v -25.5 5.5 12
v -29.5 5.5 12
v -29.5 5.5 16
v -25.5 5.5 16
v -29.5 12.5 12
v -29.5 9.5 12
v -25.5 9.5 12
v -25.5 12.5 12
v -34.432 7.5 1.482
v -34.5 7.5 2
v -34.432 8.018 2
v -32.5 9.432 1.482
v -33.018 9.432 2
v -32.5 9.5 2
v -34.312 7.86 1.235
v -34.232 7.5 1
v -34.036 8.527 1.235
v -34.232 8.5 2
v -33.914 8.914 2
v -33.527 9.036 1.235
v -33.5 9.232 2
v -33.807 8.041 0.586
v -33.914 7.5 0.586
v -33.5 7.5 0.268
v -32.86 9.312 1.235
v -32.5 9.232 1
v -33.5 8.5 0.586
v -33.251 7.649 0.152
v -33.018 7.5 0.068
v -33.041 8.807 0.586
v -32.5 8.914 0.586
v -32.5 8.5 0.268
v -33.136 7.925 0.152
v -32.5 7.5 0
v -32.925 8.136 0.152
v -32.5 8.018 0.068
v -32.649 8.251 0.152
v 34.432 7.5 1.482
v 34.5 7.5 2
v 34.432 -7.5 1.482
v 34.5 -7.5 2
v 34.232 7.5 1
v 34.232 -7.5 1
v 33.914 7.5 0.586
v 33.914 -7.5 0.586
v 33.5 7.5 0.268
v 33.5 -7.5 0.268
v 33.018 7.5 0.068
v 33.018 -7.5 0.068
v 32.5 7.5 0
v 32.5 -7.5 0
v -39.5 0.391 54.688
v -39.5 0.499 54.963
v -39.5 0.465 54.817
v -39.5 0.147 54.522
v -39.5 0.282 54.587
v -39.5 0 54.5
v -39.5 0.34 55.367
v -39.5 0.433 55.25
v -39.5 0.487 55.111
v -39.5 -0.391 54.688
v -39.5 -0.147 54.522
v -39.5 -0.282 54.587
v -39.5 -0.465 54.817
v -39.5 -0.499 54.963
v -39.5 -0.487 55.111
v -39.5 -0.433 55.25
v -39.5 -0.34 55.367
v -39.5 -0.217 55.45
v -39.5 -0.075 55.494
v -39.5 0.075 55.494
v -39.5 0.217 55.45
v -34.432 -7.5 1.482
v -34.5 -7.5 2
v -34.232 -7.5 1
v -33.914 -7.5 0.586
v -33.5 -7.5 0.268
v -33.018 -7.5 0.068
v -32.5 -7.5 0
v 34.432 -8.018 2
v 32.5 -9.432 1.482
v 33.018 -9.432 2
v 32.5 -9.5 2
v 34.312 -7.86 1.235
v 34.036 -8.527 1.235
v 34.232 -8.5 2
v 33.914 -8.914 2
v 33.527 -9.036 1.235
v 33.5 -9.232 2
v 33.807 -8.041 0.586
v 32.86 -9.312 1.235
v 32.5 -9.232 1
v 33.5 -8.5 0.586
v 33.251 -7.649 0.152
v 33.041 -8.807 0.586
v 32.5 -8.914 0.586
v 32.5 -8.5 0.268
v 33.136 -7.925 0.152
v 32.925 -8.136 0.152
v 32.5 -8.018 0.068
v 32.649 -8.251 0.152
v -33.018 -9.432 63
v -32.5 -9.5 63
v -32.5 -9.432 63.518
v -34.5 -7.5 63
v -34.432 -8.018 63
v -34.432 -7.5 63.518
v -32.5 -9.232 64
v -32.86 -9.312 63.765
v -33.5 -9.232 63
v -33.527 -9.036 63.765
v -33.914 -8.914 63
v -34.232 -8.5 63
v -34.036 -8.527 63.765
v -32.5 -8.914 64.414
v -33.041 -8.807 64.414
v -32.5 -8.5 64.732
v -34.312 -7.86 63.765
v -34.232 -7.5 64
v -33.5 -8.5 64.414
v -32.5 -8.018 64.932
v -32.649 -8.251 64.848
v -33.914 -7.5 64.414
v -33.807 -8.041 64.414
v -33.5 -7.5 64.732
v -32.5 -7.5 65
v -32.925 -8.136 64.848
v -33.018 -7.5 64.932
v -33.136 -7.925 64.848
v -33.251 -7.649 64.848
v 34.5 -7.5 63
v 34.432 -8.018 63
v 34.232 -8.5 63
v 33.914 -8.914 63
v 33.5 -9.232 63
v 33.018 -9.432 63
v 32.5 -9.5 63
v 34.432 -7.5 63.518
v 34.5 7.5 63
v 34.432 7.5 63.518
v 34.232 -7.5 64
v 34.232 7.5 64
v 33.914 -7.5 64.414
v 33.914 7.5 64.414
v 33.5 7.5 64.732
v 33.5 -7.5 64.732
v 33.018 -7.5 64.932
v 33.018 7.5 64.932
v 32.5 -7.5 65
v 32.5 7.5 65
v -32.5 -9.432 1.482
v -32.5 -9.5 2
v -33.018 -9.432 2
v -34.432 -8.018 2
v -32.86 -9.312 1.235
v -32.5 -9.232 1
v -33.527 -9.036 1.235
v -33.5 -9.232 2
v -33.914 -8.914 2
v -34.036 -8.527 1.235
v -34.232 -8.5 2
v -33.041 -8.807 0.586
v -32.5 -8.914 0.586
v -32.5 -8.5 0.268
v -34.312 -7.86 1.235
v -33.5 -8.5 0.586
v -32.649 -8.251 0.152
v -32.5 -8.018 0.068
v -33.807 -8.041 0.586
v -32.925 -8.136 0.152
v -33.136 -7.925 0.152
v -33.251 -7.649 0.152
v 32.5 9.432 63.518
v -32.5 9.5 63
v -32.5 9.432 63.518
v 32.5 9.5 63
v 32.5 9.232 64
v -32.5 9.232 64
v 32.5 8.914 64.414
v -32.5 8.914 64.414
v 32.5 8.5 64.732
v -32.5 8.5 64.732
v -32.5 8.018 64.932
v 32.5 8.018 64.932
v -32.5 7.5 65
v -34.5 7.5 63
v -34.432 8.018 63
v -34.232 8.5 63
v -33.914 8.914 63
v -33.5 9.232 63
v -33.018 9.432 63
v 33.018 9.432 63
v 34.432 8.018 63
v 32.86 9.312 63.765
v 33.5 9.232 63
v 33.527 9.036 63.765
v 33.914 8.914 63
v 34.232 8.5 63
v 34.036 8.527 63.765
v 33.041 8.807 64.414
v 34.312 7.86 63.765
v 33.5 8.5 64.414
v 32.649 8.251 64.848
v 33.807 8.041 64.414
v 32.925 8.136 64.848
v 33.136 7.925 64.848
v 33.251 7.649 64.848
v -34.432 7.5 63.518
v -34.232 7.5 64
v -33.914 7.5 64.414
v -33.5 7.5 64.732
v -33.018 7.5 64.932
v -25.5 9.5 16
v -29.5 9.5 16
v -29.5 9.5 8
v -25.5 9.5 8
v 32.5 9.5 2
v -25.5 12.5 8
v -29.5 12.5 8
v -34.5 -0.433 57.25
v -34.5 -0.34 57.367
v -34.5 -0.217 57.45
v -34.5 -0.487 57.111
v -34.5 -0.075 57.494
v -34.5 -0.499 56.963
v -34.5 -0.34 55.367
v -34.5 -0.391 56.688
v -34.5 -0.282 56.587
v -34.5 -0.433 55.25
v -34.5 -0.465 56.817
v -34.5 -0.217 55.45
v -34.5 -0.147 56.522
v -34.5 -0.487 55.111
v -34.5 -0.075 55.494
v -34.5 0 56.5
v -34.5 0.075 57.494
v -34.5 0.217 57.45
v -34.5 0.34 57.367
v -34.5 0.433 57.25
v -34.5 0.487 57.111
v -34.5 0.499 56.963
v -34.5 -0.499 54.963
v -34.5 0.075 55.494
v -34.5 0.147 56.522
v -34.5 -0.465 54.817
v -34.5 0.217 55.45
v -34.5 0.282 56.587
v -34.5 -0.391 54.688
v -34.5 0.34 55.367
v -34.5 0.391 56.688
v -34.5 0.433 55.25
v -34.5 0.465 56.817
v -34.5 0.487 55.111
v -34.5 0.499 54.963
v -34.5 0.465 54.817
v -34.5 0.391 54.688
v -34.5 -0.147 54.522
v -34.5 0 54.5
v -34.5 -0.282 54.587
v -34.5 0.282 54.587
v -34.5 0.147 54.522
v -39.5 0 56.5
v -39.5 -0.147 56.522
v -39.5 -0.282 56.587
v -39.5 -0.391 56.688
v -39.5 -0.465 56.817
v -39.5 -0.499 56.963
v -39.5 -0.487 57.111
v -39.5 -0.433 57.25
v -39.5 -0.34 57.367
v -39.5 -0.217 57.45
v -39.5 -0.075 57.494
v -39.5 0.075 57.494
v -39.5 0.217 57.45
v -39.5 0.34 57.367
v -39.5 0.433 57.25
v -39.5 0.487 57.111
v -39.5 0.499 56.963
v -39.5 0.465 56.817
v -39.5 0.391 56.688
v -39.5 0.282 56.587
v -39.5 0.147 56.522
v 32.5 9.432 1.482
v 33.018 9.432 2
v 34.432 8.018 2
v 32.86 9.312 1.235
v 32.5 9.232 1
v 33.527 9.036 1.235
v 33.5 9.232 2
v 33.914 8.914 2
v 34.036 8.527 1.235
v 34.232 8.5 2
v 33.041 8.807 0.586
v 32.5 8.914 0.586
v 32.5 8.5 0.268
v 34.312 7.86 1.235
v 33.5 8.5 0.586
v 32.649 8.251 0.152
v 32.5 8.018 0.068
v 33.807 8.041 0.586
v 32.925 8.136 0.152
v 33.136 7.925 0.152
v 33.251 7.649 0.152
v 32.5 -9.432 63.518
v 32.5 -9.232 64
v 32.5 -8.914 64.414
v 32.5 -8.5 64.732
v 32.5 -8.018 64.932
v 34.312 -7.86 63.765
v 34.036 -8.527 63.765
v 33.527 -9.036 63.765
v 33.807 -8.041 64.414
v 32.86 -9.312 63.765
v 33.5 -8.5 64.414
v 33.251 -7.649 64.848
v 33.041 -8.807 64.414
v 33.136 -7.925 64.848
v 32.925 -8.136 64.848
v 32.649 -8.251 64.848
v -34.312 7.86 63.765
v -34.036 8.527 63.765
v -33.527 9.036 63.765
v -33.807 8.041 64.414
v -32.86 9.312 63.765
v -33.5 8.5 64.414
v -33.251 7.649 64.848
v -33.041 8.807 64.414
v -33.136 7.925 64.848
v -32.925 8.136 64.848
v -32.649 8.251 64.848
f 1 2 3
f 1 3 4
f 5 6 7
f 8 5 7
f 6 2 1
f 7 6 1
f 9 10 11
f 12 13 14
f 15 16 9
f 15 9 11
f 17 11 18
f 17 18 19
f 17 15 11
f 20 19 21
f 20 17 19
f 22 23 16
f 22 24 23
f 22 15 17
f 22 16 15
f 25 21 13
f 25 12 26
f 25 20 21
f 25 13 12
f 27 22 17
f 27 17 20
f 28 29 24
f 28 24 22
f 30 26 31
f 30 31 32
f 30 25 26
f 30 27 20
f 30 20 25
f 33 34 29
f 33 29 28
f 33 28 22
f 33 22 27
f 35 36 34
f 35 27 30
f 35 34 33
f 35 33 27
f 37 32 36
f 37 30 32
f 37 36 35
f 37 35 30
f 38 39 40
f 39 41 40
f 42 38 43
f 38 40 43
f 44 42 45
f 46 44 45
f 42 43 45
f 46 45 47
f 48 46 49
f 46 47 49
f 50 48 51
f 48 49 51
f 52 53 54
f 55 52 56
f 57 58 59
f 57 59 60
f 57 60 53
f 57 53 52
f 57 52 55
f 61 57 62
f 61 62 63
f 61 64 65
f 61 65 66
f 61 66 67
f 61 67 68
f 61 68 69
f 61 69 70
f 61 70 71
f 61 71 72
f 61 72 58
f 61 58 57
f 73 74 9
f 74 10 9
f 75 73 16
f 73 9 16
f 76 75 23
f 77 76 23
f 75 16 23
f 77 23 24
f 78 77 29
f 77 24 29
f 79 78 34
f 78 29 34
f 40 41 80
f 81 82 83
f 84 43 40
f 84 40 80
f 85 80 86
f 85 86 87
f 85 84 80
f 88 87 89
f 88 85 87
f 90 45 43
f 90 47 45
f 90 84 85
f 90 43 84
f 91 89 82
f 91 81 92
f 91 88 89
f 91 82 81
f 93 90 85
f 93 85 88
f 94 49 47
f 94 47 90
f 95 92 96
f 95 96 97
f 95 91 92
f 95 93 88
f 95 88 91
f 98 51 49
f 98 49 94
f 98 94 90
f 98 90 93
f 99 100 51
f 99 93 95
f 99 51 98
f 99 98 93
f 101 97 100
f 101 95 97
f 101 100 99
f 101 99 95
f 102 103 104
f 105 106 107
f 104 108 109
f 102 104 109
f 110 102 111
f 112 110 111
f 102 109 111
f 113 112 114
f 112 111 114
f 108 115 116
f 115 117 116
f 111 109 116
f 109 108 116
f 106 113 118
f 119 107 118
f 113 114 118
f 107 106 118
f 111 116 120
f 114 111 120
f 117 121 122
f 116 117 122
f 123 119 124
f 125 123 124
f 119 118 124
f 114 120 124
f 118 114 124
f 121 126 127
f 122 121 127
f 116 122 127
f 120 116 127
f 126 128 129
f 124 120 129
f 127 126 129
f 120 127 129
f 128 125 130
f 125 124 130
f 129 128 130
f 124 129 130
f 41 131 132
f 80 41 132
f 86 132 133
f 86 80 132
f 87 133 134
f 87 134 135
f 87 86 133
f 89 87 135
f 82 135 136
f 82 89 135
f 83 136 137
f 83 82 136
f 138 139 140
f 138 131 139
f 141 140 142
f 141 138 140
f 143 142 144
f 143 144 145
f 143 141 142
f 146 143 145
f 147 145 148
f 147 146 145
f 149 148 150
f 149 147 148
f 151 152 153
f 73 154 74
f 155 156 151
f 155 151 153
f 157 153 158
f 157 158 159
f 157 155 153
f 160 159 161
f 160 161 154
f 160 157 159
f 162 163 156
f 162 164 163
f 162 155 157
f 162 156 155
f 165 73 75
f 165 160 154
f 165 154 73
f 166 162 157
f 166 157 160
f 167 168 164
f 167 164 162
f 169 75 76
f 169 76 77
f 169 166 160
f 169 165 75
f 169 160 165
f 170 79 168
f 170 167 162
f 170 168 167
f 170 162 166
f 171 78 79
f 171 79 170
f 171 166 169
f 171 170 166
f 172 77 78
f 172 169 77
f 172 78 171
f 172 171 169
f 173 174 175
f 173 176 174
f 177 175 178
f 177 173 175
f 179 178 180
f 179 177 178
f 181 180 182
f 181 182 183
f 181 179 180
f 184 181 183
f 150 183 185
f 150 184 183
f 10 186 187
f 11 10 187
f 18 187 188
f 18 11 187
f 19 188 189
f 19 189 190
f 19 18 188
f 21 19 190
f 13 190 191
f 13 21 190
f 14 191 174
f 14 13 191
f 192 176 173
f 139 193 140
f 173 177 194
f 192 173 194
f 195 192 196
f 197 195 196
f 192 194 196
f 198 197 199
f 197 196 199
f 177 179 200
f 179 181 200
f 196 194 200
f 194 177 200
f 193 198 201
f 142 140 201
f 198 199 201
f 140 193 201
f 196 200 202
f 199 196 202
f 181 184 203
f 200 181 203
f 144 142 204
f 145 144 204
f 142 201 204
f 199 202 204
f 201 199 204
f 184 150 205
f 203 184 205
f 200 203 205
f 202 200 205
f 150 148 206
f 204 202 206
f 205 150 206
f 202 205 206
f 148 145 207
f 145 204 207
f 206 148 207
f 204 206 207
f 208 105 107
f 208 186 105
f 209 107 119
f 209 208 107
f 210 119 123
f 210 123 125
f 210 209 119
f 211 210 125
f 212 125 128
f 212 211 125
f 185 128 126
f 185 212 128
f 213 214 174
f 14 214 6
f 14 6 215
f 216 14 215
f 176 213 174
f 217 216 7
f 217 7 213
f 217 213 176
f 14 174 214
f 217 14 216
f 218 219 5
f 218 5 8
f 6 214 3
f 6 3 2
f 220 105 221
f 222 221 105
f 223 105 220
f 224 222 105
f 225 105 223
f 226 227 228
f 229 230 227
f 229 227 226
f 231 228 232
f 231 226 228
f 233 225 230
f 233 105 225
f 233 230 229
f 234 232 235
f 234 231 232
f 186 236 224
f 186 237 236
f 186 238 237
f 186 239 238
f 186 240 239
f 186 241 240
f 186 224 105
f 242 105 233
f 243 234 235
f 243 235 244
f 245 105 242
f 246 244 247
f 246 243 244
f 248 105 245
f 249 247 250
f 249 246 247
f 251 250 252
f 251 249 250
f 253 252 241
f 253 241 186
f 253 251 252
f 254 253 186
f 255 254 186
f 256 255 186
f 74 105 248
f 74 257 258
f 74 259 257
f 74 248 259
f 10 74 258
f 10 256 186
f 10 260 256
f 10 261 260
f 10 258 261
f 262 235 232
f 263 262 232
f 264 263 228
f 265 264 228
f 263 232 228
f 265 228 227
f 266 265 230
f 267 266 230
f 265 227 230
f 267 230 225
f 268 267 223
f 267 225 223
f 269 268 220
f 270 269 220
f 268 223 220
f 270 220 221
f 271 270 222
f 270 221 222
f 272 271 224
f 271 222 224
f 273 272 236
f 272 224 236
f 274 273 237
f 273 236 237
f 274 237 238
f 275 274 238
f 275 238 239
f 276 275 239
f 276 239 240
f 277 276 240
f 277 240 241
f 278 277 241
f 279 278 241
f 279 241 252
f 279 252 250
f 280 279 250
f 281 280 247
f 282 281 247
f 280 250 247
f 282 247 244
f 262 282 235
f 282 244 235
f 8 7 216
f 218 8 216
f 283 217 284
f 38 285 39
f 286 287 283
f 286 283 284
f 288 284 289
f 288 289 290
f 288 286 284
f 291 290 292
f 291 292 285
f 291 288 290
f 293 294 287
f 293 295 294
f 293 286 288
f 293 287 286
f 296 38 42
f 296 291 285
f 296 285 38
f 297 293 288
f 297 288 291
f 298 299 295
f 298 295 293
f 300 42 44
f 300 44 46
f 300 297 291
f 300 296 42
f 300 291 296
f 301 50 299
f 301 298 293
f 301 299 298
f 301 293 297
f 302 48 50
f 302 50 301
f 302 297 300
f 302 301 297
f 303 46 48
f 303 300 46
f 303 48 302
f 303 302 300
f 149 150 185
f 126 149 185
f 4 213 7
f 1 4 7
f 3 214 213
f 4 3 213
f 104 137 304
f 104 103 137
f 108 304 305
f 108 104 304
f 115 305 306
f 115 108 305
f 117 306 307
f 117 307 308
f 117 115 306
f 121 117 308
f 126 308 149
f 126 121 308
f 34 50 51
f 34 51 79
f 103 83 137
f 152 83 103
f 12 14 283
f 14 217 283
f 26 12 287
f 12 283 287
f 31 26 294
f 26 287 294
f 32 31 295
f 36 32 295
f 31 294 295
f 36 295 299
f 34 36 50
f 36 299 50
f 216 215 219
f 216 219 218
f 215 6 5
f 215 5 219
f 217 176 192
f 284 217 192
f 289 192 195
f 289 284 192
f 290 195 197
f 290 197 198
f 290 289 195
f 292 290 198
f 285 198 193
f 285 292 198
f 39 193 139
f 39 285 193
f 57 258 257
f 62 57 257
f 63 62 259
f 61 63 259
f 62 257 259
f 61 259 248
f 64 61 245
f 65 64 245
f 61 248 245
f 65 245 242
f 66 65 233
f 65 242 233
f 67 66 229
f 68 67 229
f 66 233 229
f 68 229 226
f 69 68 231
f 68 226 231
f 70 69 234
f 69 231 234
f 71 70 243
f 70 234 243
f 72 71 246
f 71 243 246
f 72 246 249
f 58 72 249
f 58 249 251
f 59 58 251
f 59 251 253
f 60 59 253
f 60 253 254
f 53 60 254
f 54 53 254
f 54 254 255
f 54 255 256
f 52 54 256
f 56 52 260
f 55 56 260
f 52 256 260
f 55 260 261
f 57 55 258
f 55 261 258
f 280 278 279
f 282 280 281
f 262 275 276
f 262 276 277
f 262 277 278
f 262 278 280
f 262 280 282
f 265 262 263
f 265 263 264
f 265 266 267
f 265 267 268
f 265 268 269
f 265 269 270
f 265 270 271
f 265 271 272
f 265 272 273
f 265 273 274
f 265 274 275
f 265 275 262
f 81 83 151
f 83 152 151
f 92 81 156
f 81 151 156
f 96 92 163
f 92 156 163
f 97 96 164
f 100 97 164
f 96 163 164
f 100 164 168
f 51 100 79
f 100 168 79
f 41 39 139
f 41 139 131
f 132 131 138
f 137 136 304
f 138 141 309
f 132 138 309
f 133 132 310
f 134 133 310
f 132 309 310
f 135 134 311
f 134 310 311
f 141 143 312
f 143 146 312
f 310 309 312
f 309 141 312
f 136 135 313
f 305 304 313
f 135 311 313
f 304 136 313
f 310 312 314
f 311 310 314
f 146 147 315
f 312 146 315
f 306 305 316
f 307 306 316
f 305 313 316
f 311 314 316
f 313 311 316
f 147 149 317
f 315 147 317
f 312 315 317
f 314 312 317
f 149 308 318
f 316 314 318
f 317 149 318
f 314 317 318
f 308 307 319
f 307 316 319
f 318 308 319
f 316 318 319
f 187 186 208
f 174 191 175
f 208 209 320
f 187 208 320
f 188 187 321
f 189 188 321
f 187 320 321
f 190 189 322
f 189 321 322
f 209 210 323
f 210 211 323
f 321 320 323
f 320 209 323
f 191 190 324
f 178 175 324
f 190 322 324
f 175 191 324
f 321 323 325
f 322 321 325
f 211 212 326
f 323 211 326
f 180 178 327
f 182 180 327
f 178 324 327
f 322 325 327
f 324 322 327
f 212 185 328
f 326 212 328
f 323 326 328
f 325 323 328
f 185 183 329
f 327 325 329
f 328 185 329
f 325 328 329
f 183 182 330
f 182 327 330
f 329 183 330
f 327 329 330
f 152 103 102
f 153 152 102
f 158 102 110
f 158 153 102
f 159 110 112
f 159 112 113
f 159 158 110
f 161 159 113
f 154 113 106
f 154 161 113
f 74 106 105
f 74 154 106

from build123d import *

# Parameters (mm, degrees)
EXTRUDE_1_DEPTH     = 65
FILLET_1_R          = 2
SKETCH_2_W          = 4
SKETCH_2_H          = 8
CUT_EXTRUDE_1_DEPTH = 4
SKETCH_4_W          = 4
SKETCH_4_H          = 4
EXTRUDE_2_DEPTH     = 7
SKETCH_5_R          = 0.5
EXTRUDE_3_DEPTH     = 5


with BuildPart() as part:
    # Эскиз1 → Бобышка-Вытянуть1 (new body)
    with BuildSketch(Plane.XY):
        with BuildLine():
            Line((32.5, -9.5), (-32.5, -9.5))
            ThreePointArc((-32.5, -9.5), (-33.914213562, -8.914213562), (-34.5, -7.5))
            Line((-34.5, -7.5), (-34.5, 7.5))
            ThreePointArc((-34.5, 7.5), (-33.914213562, 8.914213562), (-32.5, 9.5))
            Line((-32.5, 9.5), (32.5, 9.5))
            ThreePointArc((32.5, 9.5), (33.914213562, 8.914213562), (34.5, 7.5))
            Line((34.5, 7.5), (34.5, -7.5))
            ThreePointArc((34.5, -7.5), (33.914213562, -8.914213562), (32.5, -9.5))
        make_face()
    extrude(amount=EXTRUDE_1_DEPTH)

    # Скругление1
    fillet_1_edges = [part.edges().sort_by_distance(p)[0] for p in [
        (-33.914213562, -8.914213562, 65),
        (-34.5, 0, 0),
        (-33.914213562, 8.914213562, 0),
        (0, -9.5, 65),
        (33.914213562, -8.914213562, 65),
        (34.5, 0, 65),
        (33.914213562, 8.914213562, 65),
        (0, 9.5, 65),
        (-33.914213562, 8.914213562, 65),
        (-34.5, 0, 65),
        (0, 9.5, 0),
        (33.914213562, 8.914213562, 0),
        (34.5, 0, 0),
        (33.914213562, -8.914213562, 0),
        (0, -9.5, 0),
        (-33.914213562, -8.914213562, 0),
    ]]
    fillet(fillet_1_edges, radius=FILLET_1_R)

    # Эскиз2 → Вырез-Вытянуть1 (cut)
    with BuildSketch(Plane(origin=(0, 9.5, 0), x_dir=(1, 0, 0), z_dir=(0, 1, 0))):
        with Locations((-27.5, -12)):
            Rectangle(SKETCH_2_W, SKETCH_2_H)
    extrude(amount=-CUT_EXTRUDE_1_DEPTH, mode=Mode.SUBTRACT)

    # Эскиз4 → Бобышка-Вытянуть2 (add)
    with BuildSketch(Plane(origin=(0, 5.5, 0), x_dir=(1, 0, 0), z_dir=(0, 1, 0))):
        with Locations((-27.5, -10)):
            Rectangle(SKETCH_4_W, SKETCH_4_H)
    extrude(amount=EXTRUDE_2_DEPTH)

    # Эскиз5 → Бобышка-Вытянуть3 (add)
    with BuildSketch(Plane.ZY.offset(34.5)):
        with Locations(Location((55, 0, 0), (0, 0, 180))):
            Circle(SKETCH_5_R)
        with Locations(Location((57, 0, 0), (0, 0, 180))):
            Circle(SKETCH_5_R)
    extrude(amount=EXTRUDE_3_DEPTH)


solid = part.part
